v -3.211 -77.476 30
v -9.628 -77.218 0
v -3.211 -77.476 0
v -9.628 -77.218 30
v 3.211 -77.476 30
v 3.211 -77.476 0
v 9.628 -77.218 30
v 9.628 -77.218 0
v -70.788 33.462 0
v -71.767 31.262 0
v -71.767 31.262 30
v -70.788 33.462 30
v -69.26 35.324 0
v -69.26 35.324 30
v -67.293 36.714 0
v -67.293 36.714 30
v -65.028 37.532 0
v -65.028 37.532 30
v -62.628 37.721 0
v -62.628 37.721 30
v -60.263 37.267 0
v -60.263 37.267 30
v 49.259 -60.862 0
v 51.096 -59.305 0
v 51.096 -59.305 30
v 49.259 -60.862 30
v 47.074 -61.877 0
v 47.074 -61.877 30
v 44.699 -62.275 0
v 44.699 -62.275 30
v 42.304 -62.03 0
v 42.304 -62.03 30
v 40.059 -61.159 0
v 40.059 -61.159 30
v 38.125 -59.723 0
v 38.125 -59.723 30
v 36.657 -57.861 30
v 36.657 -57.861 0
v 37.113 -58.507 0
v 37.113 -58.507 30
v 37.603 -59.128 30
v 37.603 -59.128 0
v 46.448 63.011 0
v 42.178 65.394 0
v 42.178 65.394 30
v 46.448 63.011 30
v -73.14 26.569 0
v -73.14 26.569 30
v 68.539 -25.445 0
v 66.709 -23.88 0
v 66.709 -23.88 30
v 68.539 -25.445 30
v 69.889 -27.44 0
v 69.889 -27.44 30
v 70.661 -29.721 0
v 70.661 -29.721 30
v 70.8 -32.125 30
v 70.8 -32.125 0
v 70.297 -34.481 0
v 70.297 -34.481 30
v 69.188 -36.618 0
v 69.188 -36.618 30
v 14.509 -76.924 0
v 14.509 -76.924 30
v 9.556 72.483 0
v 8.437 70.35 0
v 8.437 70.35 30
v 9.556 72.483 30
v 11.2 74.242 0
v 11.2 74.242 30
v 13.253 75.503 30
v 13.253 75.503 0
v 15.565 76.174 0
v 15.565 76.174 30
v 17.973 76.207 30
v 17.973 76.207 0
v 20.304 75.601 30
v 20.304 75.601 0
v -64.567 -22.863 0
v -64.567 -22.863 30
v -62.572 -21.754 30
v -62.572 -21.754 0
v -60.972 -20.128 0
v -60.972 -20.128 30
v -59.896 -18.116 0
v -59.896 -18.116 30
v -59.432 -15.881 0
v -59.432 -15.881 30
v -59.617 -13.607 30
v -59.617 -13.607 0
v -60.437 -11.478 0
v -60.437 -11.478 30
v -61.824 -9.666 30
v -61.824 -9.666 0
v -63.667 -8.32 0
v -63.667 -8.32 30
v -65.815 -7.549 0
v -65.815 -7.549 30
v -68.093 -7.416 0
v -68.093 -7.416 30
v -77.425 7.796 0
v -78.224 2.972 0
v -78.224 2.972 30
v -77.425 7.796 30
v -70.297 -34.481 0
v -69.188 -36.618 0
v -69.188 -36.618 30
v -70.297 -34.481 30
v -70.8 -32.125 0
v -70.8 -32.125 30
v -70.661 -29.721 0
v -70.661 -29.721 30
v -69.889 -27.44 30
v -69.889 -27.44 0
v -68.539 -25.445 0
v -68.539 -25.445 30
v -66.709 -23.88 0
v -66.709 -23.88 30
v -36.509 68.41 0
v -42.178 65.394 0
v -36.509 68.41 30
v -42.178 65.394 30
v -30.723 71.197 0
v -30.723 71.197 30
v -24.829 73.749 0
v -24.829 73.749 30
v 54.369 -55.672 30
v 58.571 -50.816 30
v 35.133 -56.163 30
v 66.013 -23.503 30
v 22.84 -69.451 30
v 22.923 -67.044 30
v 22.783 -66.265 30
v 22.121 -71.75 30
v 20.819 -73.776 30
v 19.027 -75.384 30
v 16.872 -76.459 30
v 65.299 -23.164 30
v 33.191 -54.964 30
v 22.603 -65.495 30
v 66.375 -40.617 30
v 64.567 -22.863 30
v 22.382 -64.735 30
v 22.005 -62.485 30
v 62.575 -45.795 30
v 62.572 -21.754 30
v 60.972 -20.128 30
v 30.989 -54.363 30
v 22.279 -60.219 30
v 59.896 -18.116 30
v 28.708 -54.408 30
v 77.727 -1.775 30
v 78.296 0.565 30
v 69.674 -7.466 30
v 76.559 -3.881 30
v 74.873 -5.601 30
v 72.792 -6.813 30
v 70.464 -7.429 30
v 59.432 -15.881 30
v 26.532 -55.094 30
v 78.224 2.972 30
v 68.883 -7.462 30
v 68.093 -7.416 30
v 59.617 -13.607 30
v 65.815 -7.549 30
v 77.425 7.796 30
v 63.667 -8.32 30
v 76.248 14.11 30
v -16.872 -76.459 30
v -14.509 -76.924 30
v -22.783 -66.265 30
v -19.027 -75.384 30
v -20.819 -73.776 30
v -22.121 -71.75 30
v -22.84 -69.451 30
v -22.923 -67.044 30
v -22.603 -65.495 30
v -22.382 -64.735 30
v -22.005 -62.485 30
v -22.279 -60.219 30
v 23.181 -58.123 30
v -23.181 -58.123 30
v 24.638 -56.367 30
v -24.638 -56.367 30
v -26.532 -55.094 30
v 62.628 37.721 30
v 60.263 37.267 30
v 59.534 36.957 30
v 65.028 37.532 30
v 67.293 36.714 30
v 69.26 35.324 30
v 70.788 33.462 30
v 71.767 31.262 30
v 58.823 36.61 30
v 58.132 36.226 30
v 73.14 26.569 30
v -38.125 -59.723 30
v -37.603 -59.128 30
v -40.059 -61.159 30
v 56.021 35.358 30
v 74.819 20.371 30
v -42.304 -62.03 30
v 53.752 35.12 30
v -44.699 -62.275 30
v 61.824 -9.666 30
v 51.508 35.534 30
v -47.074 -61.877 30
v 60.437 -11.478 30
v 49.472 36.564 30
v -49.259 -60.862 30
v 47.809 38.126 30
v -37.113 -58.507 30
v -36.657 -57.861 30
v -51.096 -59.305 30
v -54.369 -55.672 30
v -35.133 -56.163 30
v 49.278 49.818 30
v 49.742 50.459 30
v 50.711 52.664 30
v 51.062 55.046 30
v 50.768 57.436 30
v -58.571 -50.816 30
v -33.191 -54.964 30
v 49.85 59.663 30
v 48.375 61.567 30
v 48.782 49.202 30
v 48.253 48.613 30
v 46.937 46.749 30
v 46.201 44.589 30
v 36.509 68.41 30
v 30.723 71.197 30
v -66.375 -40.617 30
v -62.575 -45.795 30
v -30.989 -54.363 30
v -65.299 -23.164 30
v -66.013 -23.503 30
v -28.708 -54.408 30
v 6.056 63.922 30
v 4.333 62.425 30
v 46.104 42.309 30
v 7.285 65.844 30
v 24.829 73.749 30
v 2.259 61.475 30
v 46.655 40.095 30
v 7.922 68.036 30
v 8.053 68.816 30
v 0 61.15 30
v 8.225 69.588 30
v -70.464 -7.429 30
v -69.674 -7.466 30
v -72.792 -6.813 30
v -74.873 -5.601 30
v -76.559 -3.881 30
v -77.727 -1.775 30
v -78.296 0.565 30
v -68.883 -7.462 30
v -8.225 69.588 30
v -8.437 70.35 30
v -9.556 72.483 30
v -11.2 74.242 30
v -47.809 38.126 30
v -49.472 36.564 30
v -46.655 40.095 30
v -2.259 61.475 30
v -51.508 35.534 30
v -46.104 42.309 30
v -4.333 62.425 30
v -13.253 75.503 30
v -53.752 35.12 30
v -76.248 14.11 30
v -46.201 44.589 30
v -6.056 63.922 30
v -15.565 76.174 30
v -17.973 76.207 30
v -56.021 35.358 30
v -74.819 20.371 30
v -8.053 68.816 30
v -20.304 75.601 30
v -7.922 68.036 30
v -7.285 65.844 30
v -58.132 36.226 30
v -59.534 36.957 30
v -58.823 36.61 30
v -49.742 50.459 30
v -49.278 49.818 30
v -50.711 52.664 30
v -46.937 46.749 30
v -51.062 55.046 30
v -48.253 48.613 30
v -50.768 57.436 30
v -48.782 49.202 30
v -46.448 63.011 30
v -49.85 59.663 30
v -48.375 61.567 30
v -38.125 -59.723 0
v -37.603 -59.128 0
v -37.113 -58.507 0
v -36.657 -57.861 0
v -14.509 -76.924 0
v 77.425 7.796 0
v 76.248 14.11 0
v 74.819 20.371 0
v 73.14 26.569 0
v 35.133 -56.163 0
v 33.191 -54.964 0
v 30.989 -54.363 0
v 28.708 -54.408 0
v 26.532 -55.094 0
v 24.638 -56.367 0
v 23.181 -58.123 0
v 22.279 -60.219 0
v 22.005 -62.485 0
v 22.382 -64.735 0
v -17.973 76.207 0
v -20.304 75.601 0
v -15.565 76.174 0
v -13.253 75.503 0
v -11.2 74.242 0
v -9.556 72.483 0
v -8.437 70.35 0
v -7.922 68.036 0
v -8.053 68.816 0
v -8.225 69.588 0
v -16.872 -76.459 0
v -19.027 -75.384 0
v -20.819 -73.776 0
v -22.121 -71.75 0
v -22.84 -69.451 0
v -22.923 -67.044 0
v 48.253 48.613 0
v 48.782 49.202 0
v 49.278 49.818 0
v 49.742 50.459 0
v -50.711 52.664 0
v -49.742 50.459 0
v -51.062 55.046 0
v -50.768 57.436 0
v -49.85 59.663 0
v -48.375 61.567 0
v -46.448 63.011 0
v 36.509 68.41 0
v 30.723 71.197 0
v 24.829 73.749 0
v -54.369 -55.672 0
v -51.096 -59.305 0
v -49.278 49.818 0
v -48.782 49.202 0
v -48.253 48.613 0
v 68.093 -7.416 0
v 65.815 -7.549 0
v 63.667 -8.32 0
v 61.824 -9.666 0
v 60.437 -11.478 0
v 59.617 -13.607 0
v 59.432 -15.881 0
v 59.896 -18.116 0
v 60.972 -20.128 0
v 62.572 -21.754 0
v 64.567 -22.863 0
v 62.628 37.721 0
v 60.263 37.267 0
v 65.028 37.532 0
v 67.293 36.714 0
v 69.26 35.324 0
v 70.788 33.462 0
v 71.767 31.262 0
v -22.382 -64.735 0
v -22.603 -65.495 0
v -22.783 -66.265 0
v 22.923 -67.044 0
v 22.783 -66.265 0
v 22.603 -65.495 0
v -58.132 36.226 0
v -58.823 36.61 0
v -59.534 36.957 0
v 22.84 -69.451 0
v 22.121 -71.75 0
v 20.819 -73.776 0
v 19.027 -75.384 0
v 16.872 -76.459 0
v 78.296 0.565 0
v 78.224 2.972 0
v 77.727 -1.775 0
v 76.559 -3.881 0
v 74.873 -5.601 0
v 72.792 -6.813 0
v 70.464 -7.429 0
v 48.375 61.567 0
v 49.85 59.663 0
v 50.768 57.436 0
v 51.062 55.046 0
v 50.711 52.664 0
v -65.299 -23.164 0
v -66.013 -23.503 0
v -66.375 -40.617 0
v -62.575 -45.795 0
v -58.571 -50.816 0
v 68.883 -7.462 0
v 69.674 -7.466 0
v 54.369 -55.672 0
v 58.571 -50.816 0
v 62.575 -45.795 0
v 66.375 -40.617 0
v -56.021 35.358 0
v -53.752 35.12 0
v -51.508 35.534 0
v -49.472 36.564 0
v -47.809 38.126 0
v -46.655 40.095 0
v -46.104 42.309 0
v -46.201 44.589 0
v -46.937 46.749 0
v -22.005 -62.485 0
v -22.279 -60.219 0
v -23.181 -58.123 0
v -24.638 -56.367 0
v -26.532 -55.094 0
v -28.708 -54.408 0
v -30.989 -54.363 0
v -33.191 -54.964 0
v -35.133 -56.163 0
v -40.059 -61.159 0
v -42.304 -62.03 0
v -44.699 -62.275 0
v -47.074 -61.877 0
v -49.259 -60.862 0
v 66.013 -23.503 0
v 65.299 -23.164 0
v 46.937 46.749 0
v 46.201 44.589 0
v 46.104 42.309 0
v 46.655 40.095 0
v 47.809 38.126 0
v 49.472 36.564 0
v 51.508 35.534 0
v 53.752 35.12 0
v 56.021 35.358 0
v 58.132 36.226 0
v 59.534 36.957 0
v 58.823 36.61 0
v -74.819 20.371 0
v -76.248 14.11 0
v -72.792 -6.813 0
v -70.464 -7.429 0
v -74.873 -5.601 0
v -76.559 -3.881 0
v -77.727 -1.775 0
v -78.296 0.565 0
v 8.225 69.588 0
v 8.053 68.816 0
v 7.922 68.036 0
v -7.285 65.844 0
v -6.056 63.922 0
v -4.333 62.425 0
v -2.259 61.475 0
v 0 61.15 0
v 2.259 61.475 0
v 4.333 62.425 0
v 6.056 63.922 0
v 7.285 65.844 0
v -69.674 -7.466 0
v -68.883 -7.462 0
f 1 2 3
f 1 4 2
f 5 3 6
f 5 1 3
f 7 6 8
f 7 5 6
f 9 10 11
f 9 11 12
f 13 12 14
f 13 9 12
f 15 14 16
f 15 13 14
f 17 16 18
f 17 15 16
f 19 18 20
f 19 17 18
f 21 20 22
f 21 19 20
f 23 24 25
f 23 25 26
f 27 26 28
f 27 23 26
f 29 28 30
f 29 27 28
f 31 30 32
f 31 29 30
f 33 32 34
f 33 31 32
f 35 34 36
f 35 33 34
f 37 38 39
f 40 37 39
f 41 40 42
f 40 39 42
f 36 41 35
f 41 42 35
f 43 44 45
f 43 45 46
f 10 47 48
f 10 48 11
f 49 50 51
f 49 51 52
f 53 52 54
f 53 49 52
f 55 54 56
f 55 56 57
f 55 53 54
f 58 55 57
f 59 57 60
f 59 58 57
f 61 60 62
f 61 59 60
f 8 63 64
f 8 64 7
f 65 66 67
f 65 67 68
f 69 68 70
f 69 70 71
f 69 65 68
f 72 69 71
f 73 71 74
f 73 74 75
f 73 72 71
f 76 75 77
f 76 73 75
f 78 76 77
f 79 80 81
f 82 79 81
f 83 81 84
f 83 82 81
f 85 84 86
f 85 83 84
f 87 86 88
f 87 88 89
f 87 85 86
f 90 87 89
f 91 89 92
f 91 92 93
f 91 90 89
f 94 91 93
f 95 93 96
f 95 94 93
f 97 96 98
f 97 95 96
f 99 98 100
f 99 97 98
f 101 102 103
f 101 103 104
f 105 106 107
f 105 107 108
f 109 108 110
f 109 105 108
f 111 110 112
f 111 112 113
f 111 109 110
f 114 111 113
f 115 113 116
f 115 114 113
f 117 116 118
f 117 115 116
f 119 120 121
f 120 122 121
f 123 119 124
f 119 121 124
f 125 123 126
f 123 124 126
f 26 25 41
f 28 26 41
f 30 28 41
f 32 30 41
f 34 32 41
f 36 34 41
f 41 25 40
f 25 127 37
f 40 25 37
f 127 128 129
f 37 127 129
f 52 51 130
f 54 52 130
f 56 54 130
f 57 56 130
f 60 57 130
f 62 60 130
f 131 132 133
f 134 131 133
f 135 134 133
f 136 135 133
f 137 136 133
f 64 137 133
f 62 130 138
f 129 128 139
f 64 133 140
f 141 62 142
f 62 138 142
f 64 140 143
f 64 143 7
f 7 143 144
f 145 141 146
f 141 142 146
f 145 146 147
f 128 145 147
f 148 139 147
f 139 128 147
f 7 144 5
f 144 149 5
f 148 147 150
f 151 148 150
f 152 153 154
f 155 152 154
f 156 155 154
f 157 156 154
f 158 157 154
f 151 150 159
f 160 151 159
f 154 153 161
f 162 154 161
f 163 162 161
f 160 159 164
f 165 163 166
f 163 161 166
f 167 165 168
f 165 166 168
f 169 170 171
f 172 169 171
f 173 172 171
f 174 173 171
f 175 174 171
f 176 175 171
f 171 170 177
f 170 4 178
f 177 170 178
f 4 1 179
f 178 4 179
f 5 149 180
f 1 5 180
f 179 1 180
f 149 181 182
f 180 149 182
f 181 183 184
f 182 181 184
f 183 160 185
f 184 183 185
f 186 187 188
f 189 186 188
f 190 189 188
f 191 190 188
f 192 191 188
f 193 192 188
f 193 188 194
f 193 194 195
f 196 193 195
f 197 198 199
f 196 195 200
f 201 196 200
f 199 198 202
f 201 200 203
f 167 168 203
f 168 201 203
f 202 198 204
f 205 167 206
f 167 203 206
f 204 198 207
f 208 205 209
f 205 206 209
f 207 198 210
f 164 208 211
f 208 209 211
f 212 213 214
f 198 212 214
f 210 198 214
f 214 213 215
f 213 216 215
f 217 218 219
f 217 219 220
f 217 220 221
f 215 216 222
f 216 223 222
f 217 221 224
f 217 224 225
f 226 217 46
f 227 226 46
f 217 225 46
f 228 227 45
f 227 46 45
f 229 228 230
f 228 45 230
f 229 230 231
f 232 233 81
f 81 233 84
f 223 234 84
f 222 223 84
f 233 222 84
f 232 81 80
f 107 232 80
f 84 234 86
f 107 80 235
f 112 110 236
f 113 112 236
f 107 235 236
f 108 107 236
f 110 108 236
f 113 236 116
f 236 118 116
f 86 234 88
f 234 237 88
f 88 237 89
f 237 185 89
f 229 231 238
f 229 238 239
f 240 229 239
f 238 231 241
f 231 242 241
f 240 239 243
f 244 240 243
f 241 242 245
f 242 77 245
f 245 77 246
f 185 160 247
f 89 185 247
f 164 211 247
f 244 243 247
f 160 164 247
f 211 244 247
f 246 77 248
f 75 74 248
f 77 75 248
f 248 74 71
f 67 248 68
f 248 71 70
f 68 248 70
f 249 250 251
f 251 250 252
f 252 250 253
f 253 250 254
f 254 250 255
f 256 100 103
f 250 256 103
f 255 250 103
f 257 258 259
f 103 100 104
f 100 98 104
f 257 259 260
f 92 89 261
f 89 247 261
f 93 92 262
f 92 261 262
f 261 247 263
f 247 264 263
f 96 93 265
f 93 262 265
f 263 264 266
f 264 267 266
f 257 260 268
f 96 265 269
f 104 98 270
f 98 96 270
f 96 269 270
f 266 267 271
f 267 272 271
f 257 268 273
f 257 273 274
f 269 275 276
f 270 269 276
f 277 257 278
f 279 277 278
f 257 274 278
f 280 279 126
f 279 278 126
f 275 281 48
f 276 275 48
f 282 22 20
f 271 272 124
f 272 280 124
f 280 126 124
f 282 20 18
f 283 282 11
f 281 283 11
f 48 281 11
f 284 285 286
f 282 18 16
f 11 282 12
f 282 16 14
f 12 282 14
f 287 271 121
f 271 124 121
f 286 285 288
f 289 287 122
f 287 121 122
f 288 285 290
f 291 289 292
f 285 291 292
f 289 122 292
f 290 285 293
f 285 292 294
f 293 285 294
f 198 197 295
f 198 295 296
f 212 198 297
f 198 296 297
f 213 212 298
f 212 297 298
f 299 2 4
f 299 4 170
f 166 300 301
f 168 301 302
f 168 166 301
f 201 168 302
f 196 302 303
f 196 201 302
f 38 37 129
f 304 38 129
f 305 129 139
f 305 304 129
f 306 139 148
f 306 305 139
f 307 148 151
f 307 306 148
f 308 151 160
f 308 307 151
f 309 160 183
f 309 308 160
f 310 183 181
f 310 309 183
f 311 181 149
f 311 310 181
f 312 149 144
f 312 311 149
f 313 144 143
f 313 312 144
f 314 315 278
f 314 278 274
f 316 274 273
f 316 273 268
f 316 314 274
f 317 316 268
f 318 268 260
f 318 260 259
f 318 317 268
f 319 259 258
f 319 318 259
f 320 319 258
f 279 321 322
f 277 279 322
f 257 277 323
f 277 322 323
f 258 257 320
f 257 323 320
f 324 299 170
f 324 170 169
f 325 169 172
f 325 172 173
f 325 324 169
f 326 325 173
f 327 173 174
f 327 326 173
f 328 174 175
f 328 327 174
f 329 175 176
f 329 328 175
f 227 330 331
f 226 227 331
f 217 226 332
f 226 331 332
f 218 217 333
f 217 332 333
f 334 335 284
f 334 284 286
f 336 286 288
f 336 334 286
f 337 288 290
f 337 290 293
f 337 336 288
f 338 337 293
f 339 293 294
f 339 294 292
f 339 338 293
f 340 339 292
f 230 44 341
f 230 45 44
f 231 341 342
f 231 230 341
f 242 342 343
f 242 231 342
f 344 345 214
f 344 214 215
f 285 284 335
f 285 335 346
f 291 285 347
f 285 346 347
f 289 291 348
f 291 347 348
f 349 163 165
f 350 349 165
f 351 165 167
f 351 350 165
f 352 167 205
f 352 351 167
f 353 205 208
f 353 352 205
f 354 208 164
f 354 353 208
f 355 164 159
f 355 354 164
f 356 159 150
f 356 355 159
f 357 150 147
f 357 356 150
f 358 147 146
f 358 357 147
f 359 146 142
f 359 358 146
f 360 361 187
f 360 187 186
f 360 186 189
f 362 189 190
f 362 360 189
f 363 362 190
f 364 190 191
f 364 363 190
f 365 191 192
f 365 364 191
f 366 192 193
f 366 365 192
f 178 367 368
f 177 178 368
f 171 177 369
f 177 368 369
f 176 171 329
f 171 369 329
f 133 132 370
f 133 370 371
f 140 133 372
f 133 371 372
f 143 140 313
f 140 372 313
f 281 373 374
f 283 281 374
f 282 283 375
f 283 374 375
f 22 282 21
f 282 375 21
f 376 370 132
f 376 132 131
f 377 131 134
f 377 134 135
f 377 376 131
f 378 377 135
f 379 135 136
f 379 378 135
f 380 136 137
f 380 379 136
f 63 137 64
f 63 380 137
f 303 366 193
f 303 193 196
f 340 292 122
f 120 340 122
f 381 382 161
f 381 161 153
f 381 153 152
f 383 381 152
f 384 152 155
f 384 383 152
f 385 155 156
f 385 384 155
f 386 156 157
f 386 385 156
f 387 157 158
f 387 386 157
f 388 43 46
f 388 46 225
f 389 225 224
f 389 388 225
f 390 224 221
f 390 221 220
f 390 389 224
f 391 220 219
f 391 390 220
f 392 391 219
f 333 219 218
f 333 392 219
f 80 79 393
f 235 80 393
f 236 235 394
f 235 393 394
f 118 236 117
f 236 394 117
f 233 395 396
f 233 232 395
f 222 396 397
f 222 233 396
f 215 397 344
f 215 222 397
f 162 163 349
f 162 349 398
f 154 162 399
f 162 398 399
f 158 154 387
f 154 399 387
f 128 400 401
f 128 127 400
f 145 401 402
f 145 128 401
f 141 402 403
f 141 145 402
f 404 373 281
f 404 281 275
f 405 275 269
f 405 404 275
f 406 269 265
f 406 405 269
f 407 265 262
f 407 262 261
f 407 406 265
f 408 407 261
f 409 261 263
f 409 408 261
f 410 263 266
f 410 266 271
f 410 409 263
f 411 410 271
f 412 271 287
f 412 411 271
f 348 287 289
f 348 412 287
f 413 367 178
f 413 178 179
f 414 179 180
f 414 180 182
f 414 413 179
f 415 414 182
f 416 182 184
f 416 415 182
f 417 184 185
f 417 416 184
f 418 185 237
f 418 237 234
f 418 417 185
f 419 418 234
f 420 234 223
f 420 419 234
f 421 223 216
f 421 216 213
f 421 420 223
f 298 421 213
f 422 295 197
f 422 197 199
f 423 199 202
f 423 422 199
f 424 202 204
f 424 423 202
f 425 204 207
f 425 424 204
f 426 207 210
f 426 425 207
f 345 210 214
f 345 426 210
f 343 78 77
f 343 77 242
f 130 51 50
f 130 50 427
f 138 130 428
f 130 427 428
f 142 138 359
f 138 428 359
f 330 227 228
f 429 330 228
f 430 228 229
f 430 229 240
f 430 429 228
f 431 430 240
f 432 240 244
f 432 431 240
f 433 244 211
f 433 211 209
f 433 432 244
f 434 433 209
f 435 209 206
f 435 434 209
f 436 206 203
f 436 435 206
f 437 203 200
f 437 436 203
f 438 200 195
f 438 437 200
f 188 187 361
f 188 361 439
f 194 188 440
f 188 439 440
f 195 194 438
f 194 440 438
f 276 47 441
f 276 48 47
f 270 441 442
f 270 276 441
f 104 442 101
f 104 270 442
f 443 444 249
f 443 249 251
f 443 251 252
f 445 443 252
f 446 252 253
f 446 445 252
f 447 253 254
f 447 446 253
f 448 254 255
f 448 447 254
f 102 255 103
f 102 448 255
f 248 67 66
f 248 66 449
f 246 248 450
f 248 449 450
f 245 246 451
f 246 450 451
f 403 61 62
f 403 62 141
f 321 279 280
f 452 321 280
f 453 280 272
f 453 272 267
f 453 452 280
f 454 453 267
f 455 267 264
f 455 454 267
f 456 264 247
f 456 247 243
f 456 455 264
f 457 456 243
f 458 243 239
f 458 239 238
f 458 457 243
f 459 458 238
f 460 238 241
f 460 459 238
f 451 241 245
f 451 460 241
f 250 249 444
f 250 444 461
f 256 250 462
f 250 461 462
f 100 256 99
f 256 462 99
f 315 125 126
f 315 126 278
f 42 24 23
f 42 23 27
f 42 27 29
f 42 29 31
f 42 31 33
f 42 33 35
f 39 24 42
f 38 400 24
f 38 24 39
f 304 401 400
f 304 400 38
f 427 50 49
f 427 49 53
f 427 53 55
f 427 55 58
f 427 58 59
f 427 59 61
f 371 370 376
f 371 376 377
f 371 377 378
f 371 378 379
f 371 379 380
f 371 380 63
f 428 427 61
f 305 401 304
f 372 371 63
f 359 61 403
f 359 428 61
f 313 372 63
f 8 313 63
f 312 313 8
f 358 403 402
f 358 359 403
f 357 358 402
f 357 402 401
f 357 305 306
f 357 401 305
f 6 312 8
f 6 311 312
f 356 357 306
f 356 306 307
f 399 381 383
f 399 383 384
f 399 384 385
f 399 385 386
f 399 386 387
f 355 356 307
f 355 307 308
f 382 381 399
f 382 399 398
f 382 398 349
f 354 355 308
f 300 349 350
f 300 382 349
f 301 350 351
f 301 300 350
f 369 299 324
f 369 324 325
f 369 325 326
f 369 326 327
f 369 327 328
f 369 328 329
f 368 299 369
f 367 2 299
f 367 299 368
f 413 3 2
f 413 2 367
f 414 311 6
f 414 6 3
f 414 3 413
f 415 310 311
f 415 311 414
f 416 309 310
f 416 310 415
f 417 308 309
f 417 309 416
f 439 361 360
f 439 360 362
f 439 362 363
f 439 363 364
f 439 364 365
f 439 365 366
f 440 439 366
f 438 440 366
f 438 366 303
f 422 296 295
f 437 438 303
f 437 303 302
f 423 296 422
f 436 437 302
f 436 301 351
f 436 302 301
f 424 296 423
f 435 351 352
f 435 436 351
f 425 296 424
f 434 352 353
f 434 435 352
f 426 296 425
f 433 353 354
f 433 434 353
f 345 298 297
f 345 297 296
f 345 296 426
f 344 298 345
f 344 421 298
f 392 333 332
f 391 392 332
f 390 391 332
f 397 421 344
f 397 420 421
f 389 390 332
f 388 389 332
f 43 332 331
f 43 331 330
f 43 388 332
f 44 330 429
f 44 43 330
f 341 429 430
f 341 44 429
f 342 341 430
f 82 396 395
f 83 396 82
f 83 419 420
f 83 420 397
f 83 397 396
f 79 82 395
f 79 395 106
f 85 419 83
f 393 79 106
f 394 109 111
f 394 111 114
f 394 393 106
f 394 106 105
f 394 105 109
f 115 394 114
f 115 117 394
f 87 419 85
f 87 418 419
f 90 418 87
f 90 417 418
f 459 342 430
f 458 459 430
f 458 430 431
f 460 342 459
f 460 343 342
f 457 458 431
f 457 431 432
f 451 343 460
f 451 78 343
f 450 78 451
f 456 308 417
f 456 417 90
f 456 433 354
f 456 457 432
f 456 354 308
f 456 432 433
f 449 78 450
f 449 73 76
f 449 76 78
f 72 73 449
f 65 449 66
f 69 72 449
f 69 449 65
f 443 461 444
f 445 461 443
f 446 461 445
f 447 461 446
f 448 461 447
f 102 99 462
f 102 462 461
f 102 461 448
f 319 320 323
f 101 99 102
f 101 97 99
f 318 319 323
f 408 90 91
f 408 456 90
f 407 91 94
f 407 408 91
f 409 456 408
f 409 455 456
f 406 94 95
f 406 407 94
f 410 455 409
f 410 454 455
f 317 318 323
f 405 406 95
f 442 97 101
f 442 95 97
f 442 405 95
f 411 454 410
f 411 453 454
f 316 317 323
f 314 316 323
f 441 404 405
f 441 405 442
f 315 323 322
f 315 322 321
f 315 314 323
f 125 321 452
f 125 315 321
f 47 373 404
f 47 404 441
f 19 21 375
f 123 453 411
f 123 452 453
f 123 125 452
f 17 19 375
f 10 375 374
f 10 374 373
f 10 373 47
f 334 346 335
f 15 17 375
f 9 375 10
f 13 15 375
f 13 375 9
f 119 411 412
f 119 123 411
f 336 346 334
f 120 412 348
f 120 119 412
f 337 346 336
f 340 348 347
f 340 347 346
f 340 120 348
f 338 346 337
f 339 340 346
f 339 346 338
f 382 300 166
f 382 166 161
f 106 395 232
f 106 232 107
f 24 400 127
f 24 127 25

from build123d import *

# Parameters (mm, degrees)
ESTRUSIONE_ESTRUSIONE1_DEPTH = 30
RACCORDO1_R                  = 15
RACCORDO2_R                  = 160


with BuildPart() as part:
    # Schizzo1 → Estrusione-Estrusione1 (new body)
    with BuildSketch(Plane.XY):
        with BuildLine():
            Line((-46.448079544, 63.011055337), (-33.755592428, 70.09420993))
            Line((-33.755592428, 70.09420993), (-20.304122895, 75.601321294))
            ThreePointArc((-20.304122895, 75.601321294), (-13.252536333, 75.502654626), (-8.436946182, 70.35049977))
            Line((-8.436946182, 70.35049977), (-8, 69.15))
            ThreePointArc((-8, 69.15), (0, 61.15), (8, 69.15))
            Line((8, 69.15), (8.436946182, 70.35049977))
            ThreePointArc((8.436946182, 70.35049977), (13.252536333, 75.502654626), (20.304122895, 75.601321294))
            Line((20.304122895, 75.601321294), (33.755592428, 70.09420993))
            Line((33.755592428, 70.09420993), (46.448079544, 63.011055337))
            ThreePointArc((46.448079544, 63.011055337), (50.767531144, 57.4363853), (49.741885624, 50.459089304))
            Line((49.741885624, 50.459089304), (49.075728598, 49.368971658))
            ThreePointArc((49.075728598, 49.368971658), (47.808995153, 38.126401384), (59.051565428, 36.859667939))
            Line((59.051565428, 36.859667939), (60.262585431, 37.266549021))
            ThreePointArc((60.262585431, 37.266549021), (67.293173649, 36.713885045), (71.766906665, 31.262250331))
            Line((71.766906665, 31.262250331), (75.848127696, 17.311840191))
            Line((75.848127696, 17.311840191), (78.223930717, 2.97217952))
            ThreePointArc((78.223930717, 2.97217952), (76.558612201, -3.880653646), (70.464063006, -7.429044586))
            Line((70.464063006, -7.429044586), (69.196432599, -7.587899286))
            ThreePointArc((69.196432599, -7.587899286), (59.61684183, -13.607155111), (65.636097656, -23.186745881))
            Line((65.636097656, -23.186745881), (66.709268717, -23.87987324))
            ThreePointArc((66.709268717, -23.87987324), (70.660678677, -29.721188801), (69.187745938, -36.617932765))
            Line((69.187745938, -36.617932765), (60.82547579, -48.506698308))
            Line((60.82547579, -48.506698308), (51.095566584, -59.304808098))
            ThreePointArc((51.095566584, -59.304808098), (44.699496759, -62.275481245), (38.12536374, -59.722956378))
            Line((38.12536374, -59.722956378), (37.210811503, -58.830927303))
            ThreePointArc((37.210811503, -58.830927303), (26.531990647, -55.094246272), (22.795309617, -65.773067128))
            Line((22.795309617, -65.773067128), (22.922512038, -67.04426389))
            ThreePointArc((22.922512038, -67.04426389), (20.819251446, -73.775601279), (14.508801347, -76.92406562))
            Line((14.508801347, -76.92406562), (0, -77.798703626))
            Line((0, -77.798703626), (-14.508801347, -76.92406562))
            ThreePointArc((-14.508801347, -76.92406562), (-20.819251446, -73.775601279), (-22.922512038, -67.04426389))
            Line((-22.922512038, -67.04426389), (-22.795309617, -65.773067128))
            ThreePointArc((-22.795309617, -65.773067128), (-26.531990647, -55.094246272), (-37.210811503, -58.830927303))
            Line((-37.210811503, -58.830927303), (-38.12536374, -59.722956378))
            ThreePointArc((-38.12536374, -59.722956378), (-44.699496759, -62.275481245), (-51.095566584, -59.304808098))
            Line((-51.095566584, -59.304808098), (-60.82547579, -48.506698308))
            Line((-60.82547579, -48.506698308), (-69.187745938, -36.617932765))
            ThreePointArc((-69.187745938, -36.617932765), (-70.660678677, -29.721188801), (-66.709268717, -23.87987324))
            Line((-66.709268717, -23.87987324), (-65.636097656, -23.186745881))
            ThreePointArc((-65.636097656, -23.186745881), (-59.61684183, -13.607155111), (-69.196432599, -7.587899286))
            Line((-69.196432599, -7.587899286), (-70.464063006, -7.429044586))
            ThreePointArc((-70.464063006, -7.429044586), (-76.558612201, -3.880653646), (-78.223930717, 2.97217952))
            Line((-78.223930717, 2.97217952), (-75.848127696, 17.311840191))
            Line((-75.848127696, 17.311840191), (-71.766906665, 31.262250331))
            ThreePointArc((-71.766906665, 31.262250331), (-67.293173649, 36.713885045), (-60.262585431, 37.266549021))
            Line((-60.262585431, 37.266549021), (-59.051565428, 36.859667939))
            ThreePointArc((-59.051565428, 36.859667939), (-47.808995153, 38.126401384), (-49.075728598, 49.368971658))
            Line((-49.075728598, 49.368971658), (-49.741885624, 50.459089304))
            ThreePointArc((-49.741885624, 50.459089304), (-50.767531144, 57.4363853), (-46.448079544, 63.011055337))
        make_face()
    extrude(amount=ESTRUSIONE_ESTRUSIONE1_DEPTH)

    # Raccordo1
    # the kernel refuses this fillet: 15 mm, written as the material it takes off along each edge
    with BuildSketch(Plane(origin=(8, 69.15, -3.193862928), x_dir=(-0.06981955968385771, -0.9975596368566404, 0), z_dir=(0, 0, 1)), Plane(origin=(-49.075728598, 49.368971658, -3.193862928), x_dir=(0.7363917463007478, -0.6765553901789085, 0), z_dir=(0, 0, 1)), Plane(origin=(-69.196432599, -7.587899286, -3.193862928), x_dir=(0.9880850476667732, 0.15390886451842375, 0), z_dir=(0, 0, 1)), Plane(origin=(-37.210811503, -58.830927303, -3.193862928), x_dir=(0.49573015487791666, 0.8684766050647056, 0), z_dir=(0, 0, 1)), Plane(origin=(22.795309617, -65.773067128, -3.193862928), x_dir=(-0.3699196555863113, 0.9290637483030455, 0), z_dir=(0, 0, 1)), Plane(origin=(65.636097656, -23.186745881, -3.193862928), x_dir=(-0.9570124204082326, 0.2900469396224969, 0), z_dir=(0, 0, 1)), Plane(origin=(59.051565428, 36.859667939, -3.193862928), x_dir=(-0.8234553131670451, -0.5673811304731269, 0), z_dir=(0, 0, 1))) as raccordo1_piece_1:
        with BuildLine():
            CenterArc((2.16440635, 14.963394553), RACCORDO1_R, 256.928571472, 9.067805135)
            Line((-1.228077505, 0.35206151), (-1.295927182, 0.059834849))
            ThreePointArc((-1.295927182, 0.059834849), (-0.696711722, -0.112352983), (-0.082672969, -0.288383738))
            Line((-0.082672969, -0.288383738), (0.020945868, -0.299267891))
            ThreePointArc((0.020945868, -0.299267891), (0.558556477, -0.280477095), (1.096167087, -0.299267891))
            Line((1.096167087, -0.299267891), (1.117112955, 0))
        make_face()
    extrude(amount=36.387725855, mode=Mode.SUBTRACT)
    with BuildSketch(Plane(origin=(-59.051565428, 36.859667939, -3.193862928), x_dir=(-0.9479273461671341, 0.31848665025167716, 0), z_dir=(0, 0, 1)), Plane(origin=(-65.636097656, -23.186745881, -3.193862928), x_dir=(-0.840025923150775, -0.542546263865754, 0), z_dir=(0, 0, 1)), Plane(origin=(-22.795309617, -65.773067128, -3.193862928), x_dir=(-0.09956784659581282, -0.9950307753654017, 0), z_dir=(0, 0, 1)), Plane(origin=(37.210811503, -58.830927303, -3.193862928), x_dir=(0.7158668492597241, -0.698236818086067, 0), z_dir=(0, 0, 1)), Plane(origin=(69.196432599, -7.587899286, -3.193862928), x_dir=(0.9922392066001717, 0.12434370464748737, 0), z_dir=(0, 0, 1)), Plane(origin=(49.075728598, 49.368971658, -3.193862928), x_dir=(0.5214352033794836, 0.8532908816321646, 0), z_dir=(0, 0, 1)), Plane(origin=(-8, 69.15, -3.193862928), x_dir=(-0.3420201433256726, 0.9396926207859071, 0), z_dir=(0, 0, 1))) as raccordo1_piece_2:
        with BuildLine():
            CenterArc((2.042962228, 14.980458495), RACCORDO1_R, 258.007246785, 9.067805135)
            Line((-1.073857364, 0.307850151), (-1.136193756, 0.014397984))
            ThreePointArc((-1.136193756, 0.014397984), (-0.614221596, -0.115691701), (-0.102606043, -0.281907786))
            Line((-0.102606043, -0.281907786), (0, -0.3))
            ThreePointArc((0, -0.3), (0.638772586, -0.3), (1.26223683, -0.29960917))
            Line((1.26223683, -0.29960917), (1.277545171, 0))
        make_face()
    extrude(amount=36.387725855, mode=Mode.SUBTRACT)

    # Raccordo2
    raccordo2_edges = [part.edges().sort_by_distance(p)[0] for p in [
        (-33.755592428, 70.09420993, 15),
        (33.755592428, 70.09420993, 15),
        (75.848127696, 17.311840191, 15),
        (60.82547579, -48.506698308, 15),
        (0, -77.798703626, 15),
        (-60.82547579, -48.506698308, 15),
        (-75.848127696, 17.311840191, 15),
    ]]
    fillet(raccordo2_edges, radius=RACCORDO2_R)


solid = part.part
